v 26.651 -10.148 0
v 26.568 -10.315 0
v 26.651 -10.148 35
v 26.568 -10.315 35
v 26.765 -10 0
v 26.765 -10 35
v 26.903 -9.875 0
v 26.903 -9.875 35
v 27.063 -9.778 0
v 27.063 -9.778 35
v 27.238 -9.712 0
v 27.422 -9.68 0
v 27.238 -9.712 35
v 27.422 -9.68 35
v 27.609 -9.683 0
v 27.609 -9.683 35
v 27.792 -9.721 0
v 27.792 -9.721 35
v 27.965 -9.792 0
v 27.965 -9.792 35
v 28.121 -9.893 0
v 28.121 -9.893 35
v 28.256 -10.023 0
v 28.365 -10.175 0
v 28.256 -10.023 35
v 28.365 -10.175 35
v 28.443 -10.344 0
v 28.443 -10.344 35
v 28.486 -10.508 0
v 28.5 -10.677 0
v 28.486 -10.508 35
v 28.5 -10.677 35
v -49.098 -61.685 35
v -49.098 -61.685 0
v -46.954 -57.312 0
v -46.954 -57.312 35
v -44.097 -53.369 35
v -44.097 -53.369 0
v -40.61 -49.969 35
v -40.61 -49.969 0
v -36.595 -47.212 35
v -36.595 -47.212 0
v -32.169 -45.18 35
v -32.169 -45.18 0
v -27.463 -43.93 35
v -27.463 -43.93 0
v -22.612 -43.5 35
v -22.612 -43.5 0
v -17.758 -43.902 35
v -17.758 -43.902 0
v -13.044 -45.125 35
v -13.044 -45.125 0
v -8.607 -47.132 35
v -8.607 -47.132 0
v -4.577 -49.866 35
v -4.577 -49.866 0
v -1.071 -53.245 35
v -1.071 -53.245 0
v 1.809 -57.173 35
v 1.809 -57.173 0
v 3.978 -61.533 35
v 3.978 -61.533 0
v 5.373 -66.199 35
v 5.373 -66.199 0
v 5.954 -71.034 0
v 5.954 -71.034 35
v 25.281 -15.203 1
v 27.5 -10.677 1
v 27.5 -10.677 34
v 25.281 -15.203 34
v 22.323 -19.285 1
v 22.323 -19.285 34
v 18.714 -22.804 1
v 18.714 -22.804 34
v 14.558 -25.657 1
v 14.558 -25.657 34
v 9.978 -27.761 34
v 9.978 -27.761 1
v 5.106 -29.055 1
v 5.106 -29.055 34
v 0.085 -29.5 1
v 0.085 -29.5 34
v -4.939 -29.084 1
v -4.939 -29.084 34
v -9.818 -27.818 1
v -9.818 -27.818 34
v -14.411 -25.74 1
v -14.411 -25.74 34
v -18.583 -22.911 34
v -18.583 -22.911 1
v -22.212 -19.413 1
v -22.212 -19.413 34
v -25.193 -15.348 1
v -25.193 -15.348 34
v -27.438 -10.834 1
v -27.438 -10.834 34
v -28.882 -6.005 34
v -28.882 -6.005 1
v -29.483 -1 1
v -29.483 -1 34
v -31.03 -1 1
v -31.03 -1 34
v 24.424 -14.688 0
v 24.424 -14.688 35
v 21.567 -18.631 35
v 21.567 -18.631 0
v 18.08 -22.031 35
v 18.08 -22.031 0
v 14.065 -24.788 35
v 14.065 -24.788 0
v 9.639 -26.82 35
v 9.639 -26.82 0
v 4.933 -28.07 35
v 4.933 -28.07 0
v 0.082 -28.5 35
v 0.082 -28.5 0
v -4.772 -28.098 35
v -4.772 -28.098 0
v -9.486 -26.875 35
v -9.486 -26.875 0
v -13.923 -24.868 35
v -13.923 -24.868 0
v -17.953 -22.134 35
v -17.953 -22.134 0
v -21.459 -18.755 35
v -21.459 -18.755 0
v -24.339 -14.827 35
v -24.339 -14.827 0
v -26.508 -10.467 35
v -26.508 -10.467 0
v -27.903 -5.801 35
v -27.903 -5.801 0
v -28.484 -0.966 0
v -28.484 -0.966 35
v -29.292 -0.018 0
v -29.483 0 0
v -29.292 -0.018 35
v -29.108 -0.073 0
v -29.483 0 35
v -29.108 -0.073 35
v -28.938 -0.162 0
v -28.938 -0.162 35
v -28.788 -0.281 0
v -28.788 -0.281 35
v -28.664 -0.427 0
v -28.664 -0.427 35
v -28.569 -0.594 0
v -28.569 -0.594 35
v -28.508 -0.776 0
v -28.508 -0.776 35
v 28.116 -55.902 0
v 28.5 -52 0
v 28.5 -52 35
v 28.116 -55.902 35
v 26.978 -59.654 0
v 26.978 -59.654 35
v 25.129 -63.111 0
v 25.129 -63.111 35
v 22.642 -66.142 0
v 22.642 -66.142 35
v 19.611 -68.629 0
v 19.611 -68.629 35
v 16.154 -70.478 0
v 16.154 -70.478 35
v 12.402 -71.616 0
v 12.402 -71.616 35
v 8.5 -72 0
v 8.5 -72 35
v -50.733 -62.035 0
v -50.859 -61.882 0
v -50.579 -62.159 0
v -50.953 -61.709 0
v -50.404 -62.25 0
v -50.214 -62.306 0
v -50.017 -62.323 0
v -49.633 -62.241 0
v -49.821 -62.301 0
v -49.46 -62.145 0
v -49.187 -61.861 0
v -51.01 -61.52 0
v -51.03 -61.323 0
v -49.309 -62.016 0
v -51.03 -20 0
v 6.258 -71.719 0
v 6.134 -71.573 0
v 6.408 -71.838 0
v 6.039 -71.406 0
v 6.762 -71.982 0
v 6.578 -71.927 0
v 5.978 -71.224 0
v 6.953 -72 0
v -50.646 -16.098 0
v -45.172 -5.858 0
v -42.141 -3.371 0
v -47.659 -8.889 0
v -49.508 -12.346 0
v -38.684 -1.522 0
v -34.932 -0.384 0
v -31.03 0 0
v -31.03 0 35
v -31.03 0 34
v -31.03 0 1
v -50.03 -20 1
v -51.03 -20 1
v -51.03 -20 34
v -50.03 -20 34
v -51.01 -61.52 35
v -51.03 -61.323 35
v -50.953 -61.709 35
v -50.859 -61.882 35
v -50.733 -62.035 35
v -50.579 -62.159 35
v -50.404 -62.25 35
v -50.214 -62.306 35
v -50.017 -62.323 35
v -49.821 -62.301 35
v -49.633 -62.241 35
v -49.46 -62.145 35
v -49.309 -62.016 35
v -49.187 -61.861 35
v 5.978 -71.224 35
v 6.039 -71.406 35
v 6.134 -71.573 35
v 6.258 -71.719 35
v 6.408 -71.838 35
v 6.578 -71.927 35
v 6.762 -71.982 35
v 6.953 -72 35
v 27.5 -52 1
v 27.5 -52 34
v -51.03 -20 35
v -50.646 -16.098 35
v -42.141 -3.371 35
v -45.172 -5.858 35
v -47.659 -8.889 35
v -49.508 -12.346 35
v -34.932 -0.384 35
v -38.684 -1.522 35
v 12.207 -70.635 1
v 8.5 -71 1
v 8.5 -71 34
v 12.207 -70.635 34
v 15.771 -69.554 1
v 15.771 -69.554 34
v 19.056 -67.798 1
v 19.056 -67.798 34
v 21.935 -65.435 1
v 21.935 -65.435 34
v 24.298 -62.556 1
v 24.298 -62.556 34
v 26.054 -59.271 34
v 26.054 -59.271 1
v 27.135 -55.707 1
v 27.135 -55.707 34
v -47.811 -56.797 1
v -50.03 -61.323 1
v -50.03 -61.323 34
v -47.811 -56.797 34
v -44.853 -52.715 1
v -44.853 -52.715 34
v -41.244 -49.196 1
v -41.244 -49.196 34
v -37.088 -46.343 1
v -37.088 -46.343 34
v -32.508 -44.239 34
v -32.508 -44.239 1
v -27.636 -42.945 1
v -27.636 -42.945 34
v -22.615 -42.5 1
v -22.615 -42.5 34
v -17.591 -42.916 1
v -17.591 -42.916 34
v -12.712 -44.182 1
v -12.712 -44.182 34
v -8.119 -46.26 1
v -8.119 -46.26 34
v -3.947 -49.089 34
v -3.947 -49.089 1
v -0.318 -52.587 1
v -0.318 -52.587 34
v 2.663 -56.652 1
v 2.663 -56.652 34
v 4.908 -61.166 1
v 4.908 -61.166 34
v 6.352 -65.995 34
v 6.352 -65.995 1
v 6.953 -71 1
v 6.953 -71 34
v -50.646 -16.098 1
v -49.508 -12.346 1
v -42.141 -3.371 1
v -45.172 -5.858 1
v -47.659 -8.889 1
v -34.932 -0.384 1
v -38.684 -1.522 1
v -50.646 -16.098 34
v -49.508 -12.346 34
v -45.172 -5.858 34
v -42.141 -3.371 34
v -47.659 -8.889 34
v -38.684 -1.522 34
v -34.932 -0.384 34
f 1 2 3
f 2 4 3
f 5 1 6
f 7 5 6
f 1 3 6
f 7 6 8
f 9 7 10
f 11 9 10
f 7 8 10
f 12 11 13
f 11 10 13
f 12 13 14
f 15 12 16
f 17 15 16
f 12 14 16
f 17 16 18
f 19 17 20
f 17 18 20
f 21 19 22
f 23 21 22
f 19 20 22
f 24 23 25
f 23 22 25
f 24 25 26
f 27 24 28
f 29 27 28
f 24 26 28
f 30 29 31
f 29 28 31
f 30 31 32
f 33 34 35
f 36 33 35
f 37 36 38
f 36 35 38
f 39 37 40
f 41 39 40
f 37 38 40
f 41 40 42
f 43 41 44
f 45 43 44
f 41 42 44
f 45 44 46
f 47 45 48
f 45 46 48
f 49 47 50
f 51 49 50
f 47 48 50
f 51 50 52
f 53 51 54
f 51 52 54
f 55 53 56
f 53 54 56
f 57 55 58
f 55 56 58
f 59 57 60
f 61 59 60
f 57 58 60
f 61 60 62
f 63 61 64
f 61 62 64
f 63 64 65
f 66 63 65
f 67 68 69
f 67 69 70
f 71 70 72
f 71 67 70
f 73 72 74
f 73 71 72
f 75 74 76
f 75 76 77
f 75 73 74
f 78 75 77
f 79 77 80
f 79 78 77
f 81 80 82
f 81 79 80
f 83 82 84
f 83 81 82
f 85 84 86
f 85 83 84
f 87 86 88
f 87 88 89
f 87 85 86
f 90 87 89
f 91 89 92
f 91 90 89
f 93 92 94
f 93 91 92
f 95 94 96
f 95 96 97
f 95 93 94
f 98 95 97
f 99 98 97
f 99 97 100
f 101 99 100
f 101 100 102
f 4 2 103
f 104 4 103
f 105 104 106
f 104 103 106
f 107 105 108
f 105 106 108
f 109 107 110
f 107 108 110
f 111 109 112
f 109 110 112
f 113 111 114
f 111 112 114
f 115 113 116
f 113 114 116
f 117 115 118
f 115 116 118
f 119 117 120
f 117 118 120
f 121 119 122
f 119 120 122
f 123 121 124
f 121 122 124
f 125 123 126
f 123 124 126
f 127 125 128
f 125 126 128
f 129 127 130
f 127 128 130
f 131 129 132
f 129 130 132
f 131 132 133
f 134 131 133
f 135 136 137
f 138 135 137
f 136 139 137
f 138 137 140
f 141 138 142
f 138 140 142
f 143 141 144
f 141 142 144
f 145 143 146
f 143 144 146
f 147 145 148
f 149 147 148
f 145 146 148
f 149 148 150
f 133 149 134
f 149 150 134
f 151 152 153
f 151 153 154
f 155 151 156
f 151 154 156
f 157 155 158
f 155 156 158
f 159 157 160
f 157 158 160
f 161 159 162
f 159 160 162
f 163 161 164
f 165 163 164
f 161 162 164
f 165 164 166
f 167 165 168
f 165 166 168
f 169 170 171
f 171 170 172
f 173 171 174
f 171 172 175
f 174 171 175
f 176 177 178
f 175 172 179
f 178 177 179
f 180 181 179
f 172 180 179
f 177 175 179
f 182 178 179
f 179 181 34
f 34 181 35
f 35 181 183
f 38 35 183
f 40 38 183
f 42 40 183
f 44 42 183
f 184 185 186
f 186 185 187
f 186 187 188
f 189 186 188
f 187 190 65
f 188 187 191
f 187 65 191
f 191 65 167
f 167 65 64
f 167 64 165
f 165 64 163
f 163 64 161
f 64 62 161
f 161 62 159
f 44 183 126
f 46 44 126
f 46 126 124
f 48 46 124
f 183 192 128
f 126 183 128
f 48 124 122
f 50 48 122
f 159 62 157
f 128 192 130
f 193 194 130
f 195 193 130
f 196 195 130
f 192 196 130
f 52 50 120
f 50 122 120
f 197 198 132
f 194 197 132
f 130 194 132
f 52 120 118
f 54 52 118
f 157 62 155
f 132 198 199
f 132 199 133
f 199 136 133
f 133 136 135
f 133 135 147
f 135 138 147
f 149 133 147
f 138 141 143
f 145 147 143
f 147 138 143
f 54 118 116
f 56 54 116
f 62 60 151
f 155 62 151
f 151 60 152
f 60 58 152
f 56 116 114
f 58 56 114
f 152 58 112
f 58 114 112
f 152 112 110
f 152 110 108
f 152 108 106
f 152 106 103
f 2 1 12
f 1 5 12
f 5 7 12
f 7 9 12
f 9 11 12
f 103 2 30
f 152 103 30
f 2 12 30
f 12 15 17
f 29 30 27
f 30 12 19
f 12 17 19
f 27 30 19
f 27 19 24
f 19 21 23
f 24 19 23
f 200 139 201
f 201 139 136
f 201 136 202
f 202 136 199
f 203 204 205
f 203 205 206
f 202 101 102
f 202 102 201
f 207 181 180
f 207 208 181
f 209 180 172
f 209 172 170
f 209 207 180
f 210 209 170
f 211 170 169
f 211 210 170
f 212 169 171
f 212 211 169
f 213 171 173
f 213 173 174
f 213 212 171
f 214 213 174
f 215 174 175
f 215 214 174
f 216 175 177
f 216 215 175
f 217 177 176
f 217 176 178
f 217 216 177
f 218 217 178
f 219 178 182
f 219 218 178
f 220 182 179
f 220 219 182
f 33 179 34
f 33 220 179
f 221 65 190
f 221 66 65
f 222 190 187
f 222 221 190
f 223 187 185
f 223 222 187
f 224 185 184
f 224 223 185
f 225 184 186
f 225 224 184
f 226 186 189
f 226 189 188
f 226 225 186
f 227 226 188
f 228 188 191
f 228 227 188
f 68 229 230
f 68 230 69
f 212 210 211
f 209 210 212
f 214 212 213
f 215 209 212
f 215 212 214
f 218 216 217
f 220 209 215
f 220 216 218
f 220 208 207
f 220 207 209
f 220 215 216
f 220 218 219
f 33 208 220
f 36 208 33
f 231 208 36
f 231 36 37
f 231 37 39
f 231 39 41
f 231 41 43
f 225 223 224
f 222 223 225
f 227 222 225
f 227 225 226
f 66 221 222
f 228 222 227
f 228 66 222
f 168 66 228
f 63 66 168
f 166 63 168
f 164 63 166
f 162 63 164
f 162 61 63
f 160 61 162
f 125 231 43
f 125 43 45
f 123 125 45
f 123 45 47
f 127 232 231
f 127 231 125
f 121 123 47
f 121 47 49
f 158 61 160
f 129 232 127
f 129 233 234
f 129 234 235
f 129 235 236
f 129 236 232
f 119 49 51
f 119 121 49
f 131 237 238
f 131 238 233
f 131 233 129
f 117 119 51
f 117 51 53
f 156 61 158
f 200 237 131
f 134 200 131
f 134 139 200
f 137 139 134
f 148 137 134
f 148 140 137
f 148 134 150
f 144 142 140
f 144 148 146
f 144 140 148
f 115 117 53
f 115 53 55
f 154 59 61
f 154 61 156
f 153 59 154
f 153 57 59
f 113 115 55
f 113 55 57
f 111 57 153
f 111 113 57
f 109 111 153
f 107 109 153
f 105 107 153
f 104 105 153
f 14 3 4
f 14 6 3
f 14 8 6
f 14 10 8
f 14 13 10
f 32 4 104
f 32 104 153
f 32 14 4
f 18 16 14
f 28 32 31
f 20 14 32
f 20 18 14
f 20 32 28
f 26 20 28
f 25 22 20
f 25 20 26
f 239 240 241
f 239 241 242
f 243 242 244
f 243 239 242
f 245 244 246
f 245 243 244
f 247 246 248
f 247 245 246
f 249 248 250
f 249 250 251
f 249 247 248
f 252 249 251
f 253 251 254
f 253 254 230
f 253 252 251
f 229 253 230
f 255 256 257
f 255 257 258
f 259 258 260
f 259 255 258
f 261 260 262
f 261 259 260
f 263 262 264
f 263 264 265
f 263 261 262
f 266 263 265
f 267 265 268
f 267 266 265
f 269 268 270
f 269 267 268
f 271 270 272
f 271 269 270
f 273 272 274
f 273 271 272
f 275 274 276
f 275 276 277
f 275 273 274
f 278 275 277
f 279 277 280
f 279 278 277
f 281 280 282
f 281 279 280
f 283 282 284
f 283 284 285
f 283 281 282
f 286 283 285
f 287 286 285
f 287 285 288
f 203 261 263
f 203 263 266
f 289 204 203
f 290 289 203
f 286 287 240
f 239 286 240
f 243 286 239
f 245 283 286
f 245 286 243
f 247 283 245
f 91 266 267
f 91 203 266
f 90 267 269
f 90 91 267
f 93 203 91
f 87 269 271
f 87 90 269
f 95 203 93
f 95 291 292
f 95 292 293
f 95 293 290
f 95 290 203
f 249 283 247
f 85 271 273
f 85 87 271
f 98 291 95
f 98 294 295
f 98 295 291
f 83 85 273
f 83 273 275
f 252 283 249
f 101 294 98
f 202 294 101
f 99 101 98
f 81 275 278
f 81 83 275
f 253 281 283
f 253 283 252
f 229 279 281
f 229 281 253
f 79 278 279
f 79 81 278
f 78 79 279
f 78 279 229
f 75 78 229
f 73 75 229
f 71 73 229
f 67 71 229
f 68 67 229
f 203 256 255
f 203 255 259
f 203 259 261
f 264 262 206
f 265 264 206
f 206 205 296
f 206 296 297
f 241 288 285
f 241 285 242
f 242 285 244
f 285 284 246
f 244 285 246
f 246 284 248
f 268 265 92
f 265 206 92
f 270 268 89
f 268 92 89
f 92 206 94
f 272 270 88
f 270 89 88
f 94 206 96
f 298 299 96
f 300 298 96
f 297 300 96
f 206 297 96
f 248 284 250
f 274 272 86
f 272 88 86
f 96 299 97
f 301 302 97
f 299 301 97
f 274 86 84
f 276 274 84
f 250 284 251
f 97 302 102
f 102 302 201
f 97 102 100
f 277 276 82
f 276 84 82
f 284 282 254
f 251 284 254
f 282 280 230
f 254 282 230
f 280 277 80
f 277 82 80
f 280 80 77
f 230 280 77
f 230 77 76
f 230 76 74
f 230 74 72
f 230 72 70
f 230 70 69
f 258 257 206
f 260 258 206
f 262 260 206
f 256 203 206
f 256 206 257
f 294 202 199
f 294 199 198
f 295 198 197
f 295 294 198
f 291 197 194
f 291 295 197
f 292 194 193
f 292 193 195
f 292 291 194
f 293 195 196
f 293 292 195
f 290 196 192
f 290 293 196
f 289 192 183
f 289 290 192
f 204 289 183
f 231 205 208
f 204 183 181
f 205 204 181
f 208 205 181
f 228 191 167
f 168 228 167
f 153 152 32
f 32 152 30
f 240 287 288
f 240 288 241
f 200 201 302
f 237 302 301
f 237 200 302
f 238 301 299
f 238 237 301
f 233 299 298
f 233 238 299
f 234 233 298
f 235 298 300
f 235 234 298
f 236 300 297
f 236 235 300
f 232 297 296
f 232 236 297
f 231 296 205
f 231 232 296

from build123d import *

# Parameters (mm, degrees)
EXTRUDE_1_DEPTH = 35
FILLET_1_R      = 1
FILLET_2_R      = 20
SHELL_START     = 1
SHELL_4_DEPTH   = 33


# Read off the part's stored shape, not the designer's step: 抽壳4
with BuildPart() as part:
    # 草图3 → 凸台-拉伸1 (new body)
    with BuildSketch(Plane.XY):
        with BuildLine():
            Line((-28.5, 0), (-51.03000000000027, -2.76e-15))
            Line((-51.03000000000027, -2.76e-15), (-51.029999999999994, -72))
            ThreePointArc((-51.029999999999994, -72), (-22.529999999999987, -43.5), (5.970000000000013, -72))
            Line((5.970000000000013, -72), (28.5, -72))
            Line((28.5, -72), (28.5, 0))
            ThreePointArc((28.5, 0), (-5.24e-15, -28.5), (-28.5, 0))
        make_face()
    extrude(amount=EXTRUDE_1_DEPTH)

    # 圆角1
    fillet_1_edges = [part.edges().sort_by_distance(p)[0] for p in [
        (5.970000000000011, -72, 17.5),
        (-51.02999999999999, -72, 17.5),
        (-28.5, -2.63e-15, 17.5),
    ]]
    fillet(fillet_1_edges, radius=FILLET_1_R)
    fillet_1_2_edges = [part.edges().sort_by_distance(p)[0] for p in [
        (28.5, 0, 17.5),
    ]]
    fillet(fillet_1_2_edges, radius=FILLET_1_R)

    # 圆角2
    fillet_2_edges = [part.edges().sort_by_distance(p)[0] for p in [
        (28.5, -72, 17.5),
        (-51.03000000000027, -2.76e-15, 17.5),
    ]]
    fillet(fillet_2_edges, radius=FILLET_2_R)

    # 抽壳4 outline → 抽壳4 (cut)
    with BuildSketch(Plane.XY.offset(SHELL_START)):
        with BuildLine():
            Line((-51.03, -20), (-50.03, -20))
            Line((-50.03, -20), (-50.03, -61.322921748))
            ThreePointArc((-50.03, -61.322921748), (-17.59091317, -42.916406321), (6.953045976, -71))
            Line((6.953045976, -71), (8.5, -71))
            ThreePointArc((8.5, -71), (21.935028843, -65.435028843), (27.5, -52))
            Line((27.5, -52), (27.5, -10.677078252))
            ThreePointArc((27.5, -10.677078252), (-4.93908683, -29.083593679), (-29.483045976, -1))
            Line((-29.483045976, -1), (-31.03, -1))
            Line((-31.03, -1), (-31.03, 0))
            ThreePointArc((-31.03, 0), (-45.172135624, -5.857864376), (-51.03, -20))
        make_face()
    extrude(amount=SHELL_4_DEPTH, mode=Mode.SUBTRACT)


solid = part.part
